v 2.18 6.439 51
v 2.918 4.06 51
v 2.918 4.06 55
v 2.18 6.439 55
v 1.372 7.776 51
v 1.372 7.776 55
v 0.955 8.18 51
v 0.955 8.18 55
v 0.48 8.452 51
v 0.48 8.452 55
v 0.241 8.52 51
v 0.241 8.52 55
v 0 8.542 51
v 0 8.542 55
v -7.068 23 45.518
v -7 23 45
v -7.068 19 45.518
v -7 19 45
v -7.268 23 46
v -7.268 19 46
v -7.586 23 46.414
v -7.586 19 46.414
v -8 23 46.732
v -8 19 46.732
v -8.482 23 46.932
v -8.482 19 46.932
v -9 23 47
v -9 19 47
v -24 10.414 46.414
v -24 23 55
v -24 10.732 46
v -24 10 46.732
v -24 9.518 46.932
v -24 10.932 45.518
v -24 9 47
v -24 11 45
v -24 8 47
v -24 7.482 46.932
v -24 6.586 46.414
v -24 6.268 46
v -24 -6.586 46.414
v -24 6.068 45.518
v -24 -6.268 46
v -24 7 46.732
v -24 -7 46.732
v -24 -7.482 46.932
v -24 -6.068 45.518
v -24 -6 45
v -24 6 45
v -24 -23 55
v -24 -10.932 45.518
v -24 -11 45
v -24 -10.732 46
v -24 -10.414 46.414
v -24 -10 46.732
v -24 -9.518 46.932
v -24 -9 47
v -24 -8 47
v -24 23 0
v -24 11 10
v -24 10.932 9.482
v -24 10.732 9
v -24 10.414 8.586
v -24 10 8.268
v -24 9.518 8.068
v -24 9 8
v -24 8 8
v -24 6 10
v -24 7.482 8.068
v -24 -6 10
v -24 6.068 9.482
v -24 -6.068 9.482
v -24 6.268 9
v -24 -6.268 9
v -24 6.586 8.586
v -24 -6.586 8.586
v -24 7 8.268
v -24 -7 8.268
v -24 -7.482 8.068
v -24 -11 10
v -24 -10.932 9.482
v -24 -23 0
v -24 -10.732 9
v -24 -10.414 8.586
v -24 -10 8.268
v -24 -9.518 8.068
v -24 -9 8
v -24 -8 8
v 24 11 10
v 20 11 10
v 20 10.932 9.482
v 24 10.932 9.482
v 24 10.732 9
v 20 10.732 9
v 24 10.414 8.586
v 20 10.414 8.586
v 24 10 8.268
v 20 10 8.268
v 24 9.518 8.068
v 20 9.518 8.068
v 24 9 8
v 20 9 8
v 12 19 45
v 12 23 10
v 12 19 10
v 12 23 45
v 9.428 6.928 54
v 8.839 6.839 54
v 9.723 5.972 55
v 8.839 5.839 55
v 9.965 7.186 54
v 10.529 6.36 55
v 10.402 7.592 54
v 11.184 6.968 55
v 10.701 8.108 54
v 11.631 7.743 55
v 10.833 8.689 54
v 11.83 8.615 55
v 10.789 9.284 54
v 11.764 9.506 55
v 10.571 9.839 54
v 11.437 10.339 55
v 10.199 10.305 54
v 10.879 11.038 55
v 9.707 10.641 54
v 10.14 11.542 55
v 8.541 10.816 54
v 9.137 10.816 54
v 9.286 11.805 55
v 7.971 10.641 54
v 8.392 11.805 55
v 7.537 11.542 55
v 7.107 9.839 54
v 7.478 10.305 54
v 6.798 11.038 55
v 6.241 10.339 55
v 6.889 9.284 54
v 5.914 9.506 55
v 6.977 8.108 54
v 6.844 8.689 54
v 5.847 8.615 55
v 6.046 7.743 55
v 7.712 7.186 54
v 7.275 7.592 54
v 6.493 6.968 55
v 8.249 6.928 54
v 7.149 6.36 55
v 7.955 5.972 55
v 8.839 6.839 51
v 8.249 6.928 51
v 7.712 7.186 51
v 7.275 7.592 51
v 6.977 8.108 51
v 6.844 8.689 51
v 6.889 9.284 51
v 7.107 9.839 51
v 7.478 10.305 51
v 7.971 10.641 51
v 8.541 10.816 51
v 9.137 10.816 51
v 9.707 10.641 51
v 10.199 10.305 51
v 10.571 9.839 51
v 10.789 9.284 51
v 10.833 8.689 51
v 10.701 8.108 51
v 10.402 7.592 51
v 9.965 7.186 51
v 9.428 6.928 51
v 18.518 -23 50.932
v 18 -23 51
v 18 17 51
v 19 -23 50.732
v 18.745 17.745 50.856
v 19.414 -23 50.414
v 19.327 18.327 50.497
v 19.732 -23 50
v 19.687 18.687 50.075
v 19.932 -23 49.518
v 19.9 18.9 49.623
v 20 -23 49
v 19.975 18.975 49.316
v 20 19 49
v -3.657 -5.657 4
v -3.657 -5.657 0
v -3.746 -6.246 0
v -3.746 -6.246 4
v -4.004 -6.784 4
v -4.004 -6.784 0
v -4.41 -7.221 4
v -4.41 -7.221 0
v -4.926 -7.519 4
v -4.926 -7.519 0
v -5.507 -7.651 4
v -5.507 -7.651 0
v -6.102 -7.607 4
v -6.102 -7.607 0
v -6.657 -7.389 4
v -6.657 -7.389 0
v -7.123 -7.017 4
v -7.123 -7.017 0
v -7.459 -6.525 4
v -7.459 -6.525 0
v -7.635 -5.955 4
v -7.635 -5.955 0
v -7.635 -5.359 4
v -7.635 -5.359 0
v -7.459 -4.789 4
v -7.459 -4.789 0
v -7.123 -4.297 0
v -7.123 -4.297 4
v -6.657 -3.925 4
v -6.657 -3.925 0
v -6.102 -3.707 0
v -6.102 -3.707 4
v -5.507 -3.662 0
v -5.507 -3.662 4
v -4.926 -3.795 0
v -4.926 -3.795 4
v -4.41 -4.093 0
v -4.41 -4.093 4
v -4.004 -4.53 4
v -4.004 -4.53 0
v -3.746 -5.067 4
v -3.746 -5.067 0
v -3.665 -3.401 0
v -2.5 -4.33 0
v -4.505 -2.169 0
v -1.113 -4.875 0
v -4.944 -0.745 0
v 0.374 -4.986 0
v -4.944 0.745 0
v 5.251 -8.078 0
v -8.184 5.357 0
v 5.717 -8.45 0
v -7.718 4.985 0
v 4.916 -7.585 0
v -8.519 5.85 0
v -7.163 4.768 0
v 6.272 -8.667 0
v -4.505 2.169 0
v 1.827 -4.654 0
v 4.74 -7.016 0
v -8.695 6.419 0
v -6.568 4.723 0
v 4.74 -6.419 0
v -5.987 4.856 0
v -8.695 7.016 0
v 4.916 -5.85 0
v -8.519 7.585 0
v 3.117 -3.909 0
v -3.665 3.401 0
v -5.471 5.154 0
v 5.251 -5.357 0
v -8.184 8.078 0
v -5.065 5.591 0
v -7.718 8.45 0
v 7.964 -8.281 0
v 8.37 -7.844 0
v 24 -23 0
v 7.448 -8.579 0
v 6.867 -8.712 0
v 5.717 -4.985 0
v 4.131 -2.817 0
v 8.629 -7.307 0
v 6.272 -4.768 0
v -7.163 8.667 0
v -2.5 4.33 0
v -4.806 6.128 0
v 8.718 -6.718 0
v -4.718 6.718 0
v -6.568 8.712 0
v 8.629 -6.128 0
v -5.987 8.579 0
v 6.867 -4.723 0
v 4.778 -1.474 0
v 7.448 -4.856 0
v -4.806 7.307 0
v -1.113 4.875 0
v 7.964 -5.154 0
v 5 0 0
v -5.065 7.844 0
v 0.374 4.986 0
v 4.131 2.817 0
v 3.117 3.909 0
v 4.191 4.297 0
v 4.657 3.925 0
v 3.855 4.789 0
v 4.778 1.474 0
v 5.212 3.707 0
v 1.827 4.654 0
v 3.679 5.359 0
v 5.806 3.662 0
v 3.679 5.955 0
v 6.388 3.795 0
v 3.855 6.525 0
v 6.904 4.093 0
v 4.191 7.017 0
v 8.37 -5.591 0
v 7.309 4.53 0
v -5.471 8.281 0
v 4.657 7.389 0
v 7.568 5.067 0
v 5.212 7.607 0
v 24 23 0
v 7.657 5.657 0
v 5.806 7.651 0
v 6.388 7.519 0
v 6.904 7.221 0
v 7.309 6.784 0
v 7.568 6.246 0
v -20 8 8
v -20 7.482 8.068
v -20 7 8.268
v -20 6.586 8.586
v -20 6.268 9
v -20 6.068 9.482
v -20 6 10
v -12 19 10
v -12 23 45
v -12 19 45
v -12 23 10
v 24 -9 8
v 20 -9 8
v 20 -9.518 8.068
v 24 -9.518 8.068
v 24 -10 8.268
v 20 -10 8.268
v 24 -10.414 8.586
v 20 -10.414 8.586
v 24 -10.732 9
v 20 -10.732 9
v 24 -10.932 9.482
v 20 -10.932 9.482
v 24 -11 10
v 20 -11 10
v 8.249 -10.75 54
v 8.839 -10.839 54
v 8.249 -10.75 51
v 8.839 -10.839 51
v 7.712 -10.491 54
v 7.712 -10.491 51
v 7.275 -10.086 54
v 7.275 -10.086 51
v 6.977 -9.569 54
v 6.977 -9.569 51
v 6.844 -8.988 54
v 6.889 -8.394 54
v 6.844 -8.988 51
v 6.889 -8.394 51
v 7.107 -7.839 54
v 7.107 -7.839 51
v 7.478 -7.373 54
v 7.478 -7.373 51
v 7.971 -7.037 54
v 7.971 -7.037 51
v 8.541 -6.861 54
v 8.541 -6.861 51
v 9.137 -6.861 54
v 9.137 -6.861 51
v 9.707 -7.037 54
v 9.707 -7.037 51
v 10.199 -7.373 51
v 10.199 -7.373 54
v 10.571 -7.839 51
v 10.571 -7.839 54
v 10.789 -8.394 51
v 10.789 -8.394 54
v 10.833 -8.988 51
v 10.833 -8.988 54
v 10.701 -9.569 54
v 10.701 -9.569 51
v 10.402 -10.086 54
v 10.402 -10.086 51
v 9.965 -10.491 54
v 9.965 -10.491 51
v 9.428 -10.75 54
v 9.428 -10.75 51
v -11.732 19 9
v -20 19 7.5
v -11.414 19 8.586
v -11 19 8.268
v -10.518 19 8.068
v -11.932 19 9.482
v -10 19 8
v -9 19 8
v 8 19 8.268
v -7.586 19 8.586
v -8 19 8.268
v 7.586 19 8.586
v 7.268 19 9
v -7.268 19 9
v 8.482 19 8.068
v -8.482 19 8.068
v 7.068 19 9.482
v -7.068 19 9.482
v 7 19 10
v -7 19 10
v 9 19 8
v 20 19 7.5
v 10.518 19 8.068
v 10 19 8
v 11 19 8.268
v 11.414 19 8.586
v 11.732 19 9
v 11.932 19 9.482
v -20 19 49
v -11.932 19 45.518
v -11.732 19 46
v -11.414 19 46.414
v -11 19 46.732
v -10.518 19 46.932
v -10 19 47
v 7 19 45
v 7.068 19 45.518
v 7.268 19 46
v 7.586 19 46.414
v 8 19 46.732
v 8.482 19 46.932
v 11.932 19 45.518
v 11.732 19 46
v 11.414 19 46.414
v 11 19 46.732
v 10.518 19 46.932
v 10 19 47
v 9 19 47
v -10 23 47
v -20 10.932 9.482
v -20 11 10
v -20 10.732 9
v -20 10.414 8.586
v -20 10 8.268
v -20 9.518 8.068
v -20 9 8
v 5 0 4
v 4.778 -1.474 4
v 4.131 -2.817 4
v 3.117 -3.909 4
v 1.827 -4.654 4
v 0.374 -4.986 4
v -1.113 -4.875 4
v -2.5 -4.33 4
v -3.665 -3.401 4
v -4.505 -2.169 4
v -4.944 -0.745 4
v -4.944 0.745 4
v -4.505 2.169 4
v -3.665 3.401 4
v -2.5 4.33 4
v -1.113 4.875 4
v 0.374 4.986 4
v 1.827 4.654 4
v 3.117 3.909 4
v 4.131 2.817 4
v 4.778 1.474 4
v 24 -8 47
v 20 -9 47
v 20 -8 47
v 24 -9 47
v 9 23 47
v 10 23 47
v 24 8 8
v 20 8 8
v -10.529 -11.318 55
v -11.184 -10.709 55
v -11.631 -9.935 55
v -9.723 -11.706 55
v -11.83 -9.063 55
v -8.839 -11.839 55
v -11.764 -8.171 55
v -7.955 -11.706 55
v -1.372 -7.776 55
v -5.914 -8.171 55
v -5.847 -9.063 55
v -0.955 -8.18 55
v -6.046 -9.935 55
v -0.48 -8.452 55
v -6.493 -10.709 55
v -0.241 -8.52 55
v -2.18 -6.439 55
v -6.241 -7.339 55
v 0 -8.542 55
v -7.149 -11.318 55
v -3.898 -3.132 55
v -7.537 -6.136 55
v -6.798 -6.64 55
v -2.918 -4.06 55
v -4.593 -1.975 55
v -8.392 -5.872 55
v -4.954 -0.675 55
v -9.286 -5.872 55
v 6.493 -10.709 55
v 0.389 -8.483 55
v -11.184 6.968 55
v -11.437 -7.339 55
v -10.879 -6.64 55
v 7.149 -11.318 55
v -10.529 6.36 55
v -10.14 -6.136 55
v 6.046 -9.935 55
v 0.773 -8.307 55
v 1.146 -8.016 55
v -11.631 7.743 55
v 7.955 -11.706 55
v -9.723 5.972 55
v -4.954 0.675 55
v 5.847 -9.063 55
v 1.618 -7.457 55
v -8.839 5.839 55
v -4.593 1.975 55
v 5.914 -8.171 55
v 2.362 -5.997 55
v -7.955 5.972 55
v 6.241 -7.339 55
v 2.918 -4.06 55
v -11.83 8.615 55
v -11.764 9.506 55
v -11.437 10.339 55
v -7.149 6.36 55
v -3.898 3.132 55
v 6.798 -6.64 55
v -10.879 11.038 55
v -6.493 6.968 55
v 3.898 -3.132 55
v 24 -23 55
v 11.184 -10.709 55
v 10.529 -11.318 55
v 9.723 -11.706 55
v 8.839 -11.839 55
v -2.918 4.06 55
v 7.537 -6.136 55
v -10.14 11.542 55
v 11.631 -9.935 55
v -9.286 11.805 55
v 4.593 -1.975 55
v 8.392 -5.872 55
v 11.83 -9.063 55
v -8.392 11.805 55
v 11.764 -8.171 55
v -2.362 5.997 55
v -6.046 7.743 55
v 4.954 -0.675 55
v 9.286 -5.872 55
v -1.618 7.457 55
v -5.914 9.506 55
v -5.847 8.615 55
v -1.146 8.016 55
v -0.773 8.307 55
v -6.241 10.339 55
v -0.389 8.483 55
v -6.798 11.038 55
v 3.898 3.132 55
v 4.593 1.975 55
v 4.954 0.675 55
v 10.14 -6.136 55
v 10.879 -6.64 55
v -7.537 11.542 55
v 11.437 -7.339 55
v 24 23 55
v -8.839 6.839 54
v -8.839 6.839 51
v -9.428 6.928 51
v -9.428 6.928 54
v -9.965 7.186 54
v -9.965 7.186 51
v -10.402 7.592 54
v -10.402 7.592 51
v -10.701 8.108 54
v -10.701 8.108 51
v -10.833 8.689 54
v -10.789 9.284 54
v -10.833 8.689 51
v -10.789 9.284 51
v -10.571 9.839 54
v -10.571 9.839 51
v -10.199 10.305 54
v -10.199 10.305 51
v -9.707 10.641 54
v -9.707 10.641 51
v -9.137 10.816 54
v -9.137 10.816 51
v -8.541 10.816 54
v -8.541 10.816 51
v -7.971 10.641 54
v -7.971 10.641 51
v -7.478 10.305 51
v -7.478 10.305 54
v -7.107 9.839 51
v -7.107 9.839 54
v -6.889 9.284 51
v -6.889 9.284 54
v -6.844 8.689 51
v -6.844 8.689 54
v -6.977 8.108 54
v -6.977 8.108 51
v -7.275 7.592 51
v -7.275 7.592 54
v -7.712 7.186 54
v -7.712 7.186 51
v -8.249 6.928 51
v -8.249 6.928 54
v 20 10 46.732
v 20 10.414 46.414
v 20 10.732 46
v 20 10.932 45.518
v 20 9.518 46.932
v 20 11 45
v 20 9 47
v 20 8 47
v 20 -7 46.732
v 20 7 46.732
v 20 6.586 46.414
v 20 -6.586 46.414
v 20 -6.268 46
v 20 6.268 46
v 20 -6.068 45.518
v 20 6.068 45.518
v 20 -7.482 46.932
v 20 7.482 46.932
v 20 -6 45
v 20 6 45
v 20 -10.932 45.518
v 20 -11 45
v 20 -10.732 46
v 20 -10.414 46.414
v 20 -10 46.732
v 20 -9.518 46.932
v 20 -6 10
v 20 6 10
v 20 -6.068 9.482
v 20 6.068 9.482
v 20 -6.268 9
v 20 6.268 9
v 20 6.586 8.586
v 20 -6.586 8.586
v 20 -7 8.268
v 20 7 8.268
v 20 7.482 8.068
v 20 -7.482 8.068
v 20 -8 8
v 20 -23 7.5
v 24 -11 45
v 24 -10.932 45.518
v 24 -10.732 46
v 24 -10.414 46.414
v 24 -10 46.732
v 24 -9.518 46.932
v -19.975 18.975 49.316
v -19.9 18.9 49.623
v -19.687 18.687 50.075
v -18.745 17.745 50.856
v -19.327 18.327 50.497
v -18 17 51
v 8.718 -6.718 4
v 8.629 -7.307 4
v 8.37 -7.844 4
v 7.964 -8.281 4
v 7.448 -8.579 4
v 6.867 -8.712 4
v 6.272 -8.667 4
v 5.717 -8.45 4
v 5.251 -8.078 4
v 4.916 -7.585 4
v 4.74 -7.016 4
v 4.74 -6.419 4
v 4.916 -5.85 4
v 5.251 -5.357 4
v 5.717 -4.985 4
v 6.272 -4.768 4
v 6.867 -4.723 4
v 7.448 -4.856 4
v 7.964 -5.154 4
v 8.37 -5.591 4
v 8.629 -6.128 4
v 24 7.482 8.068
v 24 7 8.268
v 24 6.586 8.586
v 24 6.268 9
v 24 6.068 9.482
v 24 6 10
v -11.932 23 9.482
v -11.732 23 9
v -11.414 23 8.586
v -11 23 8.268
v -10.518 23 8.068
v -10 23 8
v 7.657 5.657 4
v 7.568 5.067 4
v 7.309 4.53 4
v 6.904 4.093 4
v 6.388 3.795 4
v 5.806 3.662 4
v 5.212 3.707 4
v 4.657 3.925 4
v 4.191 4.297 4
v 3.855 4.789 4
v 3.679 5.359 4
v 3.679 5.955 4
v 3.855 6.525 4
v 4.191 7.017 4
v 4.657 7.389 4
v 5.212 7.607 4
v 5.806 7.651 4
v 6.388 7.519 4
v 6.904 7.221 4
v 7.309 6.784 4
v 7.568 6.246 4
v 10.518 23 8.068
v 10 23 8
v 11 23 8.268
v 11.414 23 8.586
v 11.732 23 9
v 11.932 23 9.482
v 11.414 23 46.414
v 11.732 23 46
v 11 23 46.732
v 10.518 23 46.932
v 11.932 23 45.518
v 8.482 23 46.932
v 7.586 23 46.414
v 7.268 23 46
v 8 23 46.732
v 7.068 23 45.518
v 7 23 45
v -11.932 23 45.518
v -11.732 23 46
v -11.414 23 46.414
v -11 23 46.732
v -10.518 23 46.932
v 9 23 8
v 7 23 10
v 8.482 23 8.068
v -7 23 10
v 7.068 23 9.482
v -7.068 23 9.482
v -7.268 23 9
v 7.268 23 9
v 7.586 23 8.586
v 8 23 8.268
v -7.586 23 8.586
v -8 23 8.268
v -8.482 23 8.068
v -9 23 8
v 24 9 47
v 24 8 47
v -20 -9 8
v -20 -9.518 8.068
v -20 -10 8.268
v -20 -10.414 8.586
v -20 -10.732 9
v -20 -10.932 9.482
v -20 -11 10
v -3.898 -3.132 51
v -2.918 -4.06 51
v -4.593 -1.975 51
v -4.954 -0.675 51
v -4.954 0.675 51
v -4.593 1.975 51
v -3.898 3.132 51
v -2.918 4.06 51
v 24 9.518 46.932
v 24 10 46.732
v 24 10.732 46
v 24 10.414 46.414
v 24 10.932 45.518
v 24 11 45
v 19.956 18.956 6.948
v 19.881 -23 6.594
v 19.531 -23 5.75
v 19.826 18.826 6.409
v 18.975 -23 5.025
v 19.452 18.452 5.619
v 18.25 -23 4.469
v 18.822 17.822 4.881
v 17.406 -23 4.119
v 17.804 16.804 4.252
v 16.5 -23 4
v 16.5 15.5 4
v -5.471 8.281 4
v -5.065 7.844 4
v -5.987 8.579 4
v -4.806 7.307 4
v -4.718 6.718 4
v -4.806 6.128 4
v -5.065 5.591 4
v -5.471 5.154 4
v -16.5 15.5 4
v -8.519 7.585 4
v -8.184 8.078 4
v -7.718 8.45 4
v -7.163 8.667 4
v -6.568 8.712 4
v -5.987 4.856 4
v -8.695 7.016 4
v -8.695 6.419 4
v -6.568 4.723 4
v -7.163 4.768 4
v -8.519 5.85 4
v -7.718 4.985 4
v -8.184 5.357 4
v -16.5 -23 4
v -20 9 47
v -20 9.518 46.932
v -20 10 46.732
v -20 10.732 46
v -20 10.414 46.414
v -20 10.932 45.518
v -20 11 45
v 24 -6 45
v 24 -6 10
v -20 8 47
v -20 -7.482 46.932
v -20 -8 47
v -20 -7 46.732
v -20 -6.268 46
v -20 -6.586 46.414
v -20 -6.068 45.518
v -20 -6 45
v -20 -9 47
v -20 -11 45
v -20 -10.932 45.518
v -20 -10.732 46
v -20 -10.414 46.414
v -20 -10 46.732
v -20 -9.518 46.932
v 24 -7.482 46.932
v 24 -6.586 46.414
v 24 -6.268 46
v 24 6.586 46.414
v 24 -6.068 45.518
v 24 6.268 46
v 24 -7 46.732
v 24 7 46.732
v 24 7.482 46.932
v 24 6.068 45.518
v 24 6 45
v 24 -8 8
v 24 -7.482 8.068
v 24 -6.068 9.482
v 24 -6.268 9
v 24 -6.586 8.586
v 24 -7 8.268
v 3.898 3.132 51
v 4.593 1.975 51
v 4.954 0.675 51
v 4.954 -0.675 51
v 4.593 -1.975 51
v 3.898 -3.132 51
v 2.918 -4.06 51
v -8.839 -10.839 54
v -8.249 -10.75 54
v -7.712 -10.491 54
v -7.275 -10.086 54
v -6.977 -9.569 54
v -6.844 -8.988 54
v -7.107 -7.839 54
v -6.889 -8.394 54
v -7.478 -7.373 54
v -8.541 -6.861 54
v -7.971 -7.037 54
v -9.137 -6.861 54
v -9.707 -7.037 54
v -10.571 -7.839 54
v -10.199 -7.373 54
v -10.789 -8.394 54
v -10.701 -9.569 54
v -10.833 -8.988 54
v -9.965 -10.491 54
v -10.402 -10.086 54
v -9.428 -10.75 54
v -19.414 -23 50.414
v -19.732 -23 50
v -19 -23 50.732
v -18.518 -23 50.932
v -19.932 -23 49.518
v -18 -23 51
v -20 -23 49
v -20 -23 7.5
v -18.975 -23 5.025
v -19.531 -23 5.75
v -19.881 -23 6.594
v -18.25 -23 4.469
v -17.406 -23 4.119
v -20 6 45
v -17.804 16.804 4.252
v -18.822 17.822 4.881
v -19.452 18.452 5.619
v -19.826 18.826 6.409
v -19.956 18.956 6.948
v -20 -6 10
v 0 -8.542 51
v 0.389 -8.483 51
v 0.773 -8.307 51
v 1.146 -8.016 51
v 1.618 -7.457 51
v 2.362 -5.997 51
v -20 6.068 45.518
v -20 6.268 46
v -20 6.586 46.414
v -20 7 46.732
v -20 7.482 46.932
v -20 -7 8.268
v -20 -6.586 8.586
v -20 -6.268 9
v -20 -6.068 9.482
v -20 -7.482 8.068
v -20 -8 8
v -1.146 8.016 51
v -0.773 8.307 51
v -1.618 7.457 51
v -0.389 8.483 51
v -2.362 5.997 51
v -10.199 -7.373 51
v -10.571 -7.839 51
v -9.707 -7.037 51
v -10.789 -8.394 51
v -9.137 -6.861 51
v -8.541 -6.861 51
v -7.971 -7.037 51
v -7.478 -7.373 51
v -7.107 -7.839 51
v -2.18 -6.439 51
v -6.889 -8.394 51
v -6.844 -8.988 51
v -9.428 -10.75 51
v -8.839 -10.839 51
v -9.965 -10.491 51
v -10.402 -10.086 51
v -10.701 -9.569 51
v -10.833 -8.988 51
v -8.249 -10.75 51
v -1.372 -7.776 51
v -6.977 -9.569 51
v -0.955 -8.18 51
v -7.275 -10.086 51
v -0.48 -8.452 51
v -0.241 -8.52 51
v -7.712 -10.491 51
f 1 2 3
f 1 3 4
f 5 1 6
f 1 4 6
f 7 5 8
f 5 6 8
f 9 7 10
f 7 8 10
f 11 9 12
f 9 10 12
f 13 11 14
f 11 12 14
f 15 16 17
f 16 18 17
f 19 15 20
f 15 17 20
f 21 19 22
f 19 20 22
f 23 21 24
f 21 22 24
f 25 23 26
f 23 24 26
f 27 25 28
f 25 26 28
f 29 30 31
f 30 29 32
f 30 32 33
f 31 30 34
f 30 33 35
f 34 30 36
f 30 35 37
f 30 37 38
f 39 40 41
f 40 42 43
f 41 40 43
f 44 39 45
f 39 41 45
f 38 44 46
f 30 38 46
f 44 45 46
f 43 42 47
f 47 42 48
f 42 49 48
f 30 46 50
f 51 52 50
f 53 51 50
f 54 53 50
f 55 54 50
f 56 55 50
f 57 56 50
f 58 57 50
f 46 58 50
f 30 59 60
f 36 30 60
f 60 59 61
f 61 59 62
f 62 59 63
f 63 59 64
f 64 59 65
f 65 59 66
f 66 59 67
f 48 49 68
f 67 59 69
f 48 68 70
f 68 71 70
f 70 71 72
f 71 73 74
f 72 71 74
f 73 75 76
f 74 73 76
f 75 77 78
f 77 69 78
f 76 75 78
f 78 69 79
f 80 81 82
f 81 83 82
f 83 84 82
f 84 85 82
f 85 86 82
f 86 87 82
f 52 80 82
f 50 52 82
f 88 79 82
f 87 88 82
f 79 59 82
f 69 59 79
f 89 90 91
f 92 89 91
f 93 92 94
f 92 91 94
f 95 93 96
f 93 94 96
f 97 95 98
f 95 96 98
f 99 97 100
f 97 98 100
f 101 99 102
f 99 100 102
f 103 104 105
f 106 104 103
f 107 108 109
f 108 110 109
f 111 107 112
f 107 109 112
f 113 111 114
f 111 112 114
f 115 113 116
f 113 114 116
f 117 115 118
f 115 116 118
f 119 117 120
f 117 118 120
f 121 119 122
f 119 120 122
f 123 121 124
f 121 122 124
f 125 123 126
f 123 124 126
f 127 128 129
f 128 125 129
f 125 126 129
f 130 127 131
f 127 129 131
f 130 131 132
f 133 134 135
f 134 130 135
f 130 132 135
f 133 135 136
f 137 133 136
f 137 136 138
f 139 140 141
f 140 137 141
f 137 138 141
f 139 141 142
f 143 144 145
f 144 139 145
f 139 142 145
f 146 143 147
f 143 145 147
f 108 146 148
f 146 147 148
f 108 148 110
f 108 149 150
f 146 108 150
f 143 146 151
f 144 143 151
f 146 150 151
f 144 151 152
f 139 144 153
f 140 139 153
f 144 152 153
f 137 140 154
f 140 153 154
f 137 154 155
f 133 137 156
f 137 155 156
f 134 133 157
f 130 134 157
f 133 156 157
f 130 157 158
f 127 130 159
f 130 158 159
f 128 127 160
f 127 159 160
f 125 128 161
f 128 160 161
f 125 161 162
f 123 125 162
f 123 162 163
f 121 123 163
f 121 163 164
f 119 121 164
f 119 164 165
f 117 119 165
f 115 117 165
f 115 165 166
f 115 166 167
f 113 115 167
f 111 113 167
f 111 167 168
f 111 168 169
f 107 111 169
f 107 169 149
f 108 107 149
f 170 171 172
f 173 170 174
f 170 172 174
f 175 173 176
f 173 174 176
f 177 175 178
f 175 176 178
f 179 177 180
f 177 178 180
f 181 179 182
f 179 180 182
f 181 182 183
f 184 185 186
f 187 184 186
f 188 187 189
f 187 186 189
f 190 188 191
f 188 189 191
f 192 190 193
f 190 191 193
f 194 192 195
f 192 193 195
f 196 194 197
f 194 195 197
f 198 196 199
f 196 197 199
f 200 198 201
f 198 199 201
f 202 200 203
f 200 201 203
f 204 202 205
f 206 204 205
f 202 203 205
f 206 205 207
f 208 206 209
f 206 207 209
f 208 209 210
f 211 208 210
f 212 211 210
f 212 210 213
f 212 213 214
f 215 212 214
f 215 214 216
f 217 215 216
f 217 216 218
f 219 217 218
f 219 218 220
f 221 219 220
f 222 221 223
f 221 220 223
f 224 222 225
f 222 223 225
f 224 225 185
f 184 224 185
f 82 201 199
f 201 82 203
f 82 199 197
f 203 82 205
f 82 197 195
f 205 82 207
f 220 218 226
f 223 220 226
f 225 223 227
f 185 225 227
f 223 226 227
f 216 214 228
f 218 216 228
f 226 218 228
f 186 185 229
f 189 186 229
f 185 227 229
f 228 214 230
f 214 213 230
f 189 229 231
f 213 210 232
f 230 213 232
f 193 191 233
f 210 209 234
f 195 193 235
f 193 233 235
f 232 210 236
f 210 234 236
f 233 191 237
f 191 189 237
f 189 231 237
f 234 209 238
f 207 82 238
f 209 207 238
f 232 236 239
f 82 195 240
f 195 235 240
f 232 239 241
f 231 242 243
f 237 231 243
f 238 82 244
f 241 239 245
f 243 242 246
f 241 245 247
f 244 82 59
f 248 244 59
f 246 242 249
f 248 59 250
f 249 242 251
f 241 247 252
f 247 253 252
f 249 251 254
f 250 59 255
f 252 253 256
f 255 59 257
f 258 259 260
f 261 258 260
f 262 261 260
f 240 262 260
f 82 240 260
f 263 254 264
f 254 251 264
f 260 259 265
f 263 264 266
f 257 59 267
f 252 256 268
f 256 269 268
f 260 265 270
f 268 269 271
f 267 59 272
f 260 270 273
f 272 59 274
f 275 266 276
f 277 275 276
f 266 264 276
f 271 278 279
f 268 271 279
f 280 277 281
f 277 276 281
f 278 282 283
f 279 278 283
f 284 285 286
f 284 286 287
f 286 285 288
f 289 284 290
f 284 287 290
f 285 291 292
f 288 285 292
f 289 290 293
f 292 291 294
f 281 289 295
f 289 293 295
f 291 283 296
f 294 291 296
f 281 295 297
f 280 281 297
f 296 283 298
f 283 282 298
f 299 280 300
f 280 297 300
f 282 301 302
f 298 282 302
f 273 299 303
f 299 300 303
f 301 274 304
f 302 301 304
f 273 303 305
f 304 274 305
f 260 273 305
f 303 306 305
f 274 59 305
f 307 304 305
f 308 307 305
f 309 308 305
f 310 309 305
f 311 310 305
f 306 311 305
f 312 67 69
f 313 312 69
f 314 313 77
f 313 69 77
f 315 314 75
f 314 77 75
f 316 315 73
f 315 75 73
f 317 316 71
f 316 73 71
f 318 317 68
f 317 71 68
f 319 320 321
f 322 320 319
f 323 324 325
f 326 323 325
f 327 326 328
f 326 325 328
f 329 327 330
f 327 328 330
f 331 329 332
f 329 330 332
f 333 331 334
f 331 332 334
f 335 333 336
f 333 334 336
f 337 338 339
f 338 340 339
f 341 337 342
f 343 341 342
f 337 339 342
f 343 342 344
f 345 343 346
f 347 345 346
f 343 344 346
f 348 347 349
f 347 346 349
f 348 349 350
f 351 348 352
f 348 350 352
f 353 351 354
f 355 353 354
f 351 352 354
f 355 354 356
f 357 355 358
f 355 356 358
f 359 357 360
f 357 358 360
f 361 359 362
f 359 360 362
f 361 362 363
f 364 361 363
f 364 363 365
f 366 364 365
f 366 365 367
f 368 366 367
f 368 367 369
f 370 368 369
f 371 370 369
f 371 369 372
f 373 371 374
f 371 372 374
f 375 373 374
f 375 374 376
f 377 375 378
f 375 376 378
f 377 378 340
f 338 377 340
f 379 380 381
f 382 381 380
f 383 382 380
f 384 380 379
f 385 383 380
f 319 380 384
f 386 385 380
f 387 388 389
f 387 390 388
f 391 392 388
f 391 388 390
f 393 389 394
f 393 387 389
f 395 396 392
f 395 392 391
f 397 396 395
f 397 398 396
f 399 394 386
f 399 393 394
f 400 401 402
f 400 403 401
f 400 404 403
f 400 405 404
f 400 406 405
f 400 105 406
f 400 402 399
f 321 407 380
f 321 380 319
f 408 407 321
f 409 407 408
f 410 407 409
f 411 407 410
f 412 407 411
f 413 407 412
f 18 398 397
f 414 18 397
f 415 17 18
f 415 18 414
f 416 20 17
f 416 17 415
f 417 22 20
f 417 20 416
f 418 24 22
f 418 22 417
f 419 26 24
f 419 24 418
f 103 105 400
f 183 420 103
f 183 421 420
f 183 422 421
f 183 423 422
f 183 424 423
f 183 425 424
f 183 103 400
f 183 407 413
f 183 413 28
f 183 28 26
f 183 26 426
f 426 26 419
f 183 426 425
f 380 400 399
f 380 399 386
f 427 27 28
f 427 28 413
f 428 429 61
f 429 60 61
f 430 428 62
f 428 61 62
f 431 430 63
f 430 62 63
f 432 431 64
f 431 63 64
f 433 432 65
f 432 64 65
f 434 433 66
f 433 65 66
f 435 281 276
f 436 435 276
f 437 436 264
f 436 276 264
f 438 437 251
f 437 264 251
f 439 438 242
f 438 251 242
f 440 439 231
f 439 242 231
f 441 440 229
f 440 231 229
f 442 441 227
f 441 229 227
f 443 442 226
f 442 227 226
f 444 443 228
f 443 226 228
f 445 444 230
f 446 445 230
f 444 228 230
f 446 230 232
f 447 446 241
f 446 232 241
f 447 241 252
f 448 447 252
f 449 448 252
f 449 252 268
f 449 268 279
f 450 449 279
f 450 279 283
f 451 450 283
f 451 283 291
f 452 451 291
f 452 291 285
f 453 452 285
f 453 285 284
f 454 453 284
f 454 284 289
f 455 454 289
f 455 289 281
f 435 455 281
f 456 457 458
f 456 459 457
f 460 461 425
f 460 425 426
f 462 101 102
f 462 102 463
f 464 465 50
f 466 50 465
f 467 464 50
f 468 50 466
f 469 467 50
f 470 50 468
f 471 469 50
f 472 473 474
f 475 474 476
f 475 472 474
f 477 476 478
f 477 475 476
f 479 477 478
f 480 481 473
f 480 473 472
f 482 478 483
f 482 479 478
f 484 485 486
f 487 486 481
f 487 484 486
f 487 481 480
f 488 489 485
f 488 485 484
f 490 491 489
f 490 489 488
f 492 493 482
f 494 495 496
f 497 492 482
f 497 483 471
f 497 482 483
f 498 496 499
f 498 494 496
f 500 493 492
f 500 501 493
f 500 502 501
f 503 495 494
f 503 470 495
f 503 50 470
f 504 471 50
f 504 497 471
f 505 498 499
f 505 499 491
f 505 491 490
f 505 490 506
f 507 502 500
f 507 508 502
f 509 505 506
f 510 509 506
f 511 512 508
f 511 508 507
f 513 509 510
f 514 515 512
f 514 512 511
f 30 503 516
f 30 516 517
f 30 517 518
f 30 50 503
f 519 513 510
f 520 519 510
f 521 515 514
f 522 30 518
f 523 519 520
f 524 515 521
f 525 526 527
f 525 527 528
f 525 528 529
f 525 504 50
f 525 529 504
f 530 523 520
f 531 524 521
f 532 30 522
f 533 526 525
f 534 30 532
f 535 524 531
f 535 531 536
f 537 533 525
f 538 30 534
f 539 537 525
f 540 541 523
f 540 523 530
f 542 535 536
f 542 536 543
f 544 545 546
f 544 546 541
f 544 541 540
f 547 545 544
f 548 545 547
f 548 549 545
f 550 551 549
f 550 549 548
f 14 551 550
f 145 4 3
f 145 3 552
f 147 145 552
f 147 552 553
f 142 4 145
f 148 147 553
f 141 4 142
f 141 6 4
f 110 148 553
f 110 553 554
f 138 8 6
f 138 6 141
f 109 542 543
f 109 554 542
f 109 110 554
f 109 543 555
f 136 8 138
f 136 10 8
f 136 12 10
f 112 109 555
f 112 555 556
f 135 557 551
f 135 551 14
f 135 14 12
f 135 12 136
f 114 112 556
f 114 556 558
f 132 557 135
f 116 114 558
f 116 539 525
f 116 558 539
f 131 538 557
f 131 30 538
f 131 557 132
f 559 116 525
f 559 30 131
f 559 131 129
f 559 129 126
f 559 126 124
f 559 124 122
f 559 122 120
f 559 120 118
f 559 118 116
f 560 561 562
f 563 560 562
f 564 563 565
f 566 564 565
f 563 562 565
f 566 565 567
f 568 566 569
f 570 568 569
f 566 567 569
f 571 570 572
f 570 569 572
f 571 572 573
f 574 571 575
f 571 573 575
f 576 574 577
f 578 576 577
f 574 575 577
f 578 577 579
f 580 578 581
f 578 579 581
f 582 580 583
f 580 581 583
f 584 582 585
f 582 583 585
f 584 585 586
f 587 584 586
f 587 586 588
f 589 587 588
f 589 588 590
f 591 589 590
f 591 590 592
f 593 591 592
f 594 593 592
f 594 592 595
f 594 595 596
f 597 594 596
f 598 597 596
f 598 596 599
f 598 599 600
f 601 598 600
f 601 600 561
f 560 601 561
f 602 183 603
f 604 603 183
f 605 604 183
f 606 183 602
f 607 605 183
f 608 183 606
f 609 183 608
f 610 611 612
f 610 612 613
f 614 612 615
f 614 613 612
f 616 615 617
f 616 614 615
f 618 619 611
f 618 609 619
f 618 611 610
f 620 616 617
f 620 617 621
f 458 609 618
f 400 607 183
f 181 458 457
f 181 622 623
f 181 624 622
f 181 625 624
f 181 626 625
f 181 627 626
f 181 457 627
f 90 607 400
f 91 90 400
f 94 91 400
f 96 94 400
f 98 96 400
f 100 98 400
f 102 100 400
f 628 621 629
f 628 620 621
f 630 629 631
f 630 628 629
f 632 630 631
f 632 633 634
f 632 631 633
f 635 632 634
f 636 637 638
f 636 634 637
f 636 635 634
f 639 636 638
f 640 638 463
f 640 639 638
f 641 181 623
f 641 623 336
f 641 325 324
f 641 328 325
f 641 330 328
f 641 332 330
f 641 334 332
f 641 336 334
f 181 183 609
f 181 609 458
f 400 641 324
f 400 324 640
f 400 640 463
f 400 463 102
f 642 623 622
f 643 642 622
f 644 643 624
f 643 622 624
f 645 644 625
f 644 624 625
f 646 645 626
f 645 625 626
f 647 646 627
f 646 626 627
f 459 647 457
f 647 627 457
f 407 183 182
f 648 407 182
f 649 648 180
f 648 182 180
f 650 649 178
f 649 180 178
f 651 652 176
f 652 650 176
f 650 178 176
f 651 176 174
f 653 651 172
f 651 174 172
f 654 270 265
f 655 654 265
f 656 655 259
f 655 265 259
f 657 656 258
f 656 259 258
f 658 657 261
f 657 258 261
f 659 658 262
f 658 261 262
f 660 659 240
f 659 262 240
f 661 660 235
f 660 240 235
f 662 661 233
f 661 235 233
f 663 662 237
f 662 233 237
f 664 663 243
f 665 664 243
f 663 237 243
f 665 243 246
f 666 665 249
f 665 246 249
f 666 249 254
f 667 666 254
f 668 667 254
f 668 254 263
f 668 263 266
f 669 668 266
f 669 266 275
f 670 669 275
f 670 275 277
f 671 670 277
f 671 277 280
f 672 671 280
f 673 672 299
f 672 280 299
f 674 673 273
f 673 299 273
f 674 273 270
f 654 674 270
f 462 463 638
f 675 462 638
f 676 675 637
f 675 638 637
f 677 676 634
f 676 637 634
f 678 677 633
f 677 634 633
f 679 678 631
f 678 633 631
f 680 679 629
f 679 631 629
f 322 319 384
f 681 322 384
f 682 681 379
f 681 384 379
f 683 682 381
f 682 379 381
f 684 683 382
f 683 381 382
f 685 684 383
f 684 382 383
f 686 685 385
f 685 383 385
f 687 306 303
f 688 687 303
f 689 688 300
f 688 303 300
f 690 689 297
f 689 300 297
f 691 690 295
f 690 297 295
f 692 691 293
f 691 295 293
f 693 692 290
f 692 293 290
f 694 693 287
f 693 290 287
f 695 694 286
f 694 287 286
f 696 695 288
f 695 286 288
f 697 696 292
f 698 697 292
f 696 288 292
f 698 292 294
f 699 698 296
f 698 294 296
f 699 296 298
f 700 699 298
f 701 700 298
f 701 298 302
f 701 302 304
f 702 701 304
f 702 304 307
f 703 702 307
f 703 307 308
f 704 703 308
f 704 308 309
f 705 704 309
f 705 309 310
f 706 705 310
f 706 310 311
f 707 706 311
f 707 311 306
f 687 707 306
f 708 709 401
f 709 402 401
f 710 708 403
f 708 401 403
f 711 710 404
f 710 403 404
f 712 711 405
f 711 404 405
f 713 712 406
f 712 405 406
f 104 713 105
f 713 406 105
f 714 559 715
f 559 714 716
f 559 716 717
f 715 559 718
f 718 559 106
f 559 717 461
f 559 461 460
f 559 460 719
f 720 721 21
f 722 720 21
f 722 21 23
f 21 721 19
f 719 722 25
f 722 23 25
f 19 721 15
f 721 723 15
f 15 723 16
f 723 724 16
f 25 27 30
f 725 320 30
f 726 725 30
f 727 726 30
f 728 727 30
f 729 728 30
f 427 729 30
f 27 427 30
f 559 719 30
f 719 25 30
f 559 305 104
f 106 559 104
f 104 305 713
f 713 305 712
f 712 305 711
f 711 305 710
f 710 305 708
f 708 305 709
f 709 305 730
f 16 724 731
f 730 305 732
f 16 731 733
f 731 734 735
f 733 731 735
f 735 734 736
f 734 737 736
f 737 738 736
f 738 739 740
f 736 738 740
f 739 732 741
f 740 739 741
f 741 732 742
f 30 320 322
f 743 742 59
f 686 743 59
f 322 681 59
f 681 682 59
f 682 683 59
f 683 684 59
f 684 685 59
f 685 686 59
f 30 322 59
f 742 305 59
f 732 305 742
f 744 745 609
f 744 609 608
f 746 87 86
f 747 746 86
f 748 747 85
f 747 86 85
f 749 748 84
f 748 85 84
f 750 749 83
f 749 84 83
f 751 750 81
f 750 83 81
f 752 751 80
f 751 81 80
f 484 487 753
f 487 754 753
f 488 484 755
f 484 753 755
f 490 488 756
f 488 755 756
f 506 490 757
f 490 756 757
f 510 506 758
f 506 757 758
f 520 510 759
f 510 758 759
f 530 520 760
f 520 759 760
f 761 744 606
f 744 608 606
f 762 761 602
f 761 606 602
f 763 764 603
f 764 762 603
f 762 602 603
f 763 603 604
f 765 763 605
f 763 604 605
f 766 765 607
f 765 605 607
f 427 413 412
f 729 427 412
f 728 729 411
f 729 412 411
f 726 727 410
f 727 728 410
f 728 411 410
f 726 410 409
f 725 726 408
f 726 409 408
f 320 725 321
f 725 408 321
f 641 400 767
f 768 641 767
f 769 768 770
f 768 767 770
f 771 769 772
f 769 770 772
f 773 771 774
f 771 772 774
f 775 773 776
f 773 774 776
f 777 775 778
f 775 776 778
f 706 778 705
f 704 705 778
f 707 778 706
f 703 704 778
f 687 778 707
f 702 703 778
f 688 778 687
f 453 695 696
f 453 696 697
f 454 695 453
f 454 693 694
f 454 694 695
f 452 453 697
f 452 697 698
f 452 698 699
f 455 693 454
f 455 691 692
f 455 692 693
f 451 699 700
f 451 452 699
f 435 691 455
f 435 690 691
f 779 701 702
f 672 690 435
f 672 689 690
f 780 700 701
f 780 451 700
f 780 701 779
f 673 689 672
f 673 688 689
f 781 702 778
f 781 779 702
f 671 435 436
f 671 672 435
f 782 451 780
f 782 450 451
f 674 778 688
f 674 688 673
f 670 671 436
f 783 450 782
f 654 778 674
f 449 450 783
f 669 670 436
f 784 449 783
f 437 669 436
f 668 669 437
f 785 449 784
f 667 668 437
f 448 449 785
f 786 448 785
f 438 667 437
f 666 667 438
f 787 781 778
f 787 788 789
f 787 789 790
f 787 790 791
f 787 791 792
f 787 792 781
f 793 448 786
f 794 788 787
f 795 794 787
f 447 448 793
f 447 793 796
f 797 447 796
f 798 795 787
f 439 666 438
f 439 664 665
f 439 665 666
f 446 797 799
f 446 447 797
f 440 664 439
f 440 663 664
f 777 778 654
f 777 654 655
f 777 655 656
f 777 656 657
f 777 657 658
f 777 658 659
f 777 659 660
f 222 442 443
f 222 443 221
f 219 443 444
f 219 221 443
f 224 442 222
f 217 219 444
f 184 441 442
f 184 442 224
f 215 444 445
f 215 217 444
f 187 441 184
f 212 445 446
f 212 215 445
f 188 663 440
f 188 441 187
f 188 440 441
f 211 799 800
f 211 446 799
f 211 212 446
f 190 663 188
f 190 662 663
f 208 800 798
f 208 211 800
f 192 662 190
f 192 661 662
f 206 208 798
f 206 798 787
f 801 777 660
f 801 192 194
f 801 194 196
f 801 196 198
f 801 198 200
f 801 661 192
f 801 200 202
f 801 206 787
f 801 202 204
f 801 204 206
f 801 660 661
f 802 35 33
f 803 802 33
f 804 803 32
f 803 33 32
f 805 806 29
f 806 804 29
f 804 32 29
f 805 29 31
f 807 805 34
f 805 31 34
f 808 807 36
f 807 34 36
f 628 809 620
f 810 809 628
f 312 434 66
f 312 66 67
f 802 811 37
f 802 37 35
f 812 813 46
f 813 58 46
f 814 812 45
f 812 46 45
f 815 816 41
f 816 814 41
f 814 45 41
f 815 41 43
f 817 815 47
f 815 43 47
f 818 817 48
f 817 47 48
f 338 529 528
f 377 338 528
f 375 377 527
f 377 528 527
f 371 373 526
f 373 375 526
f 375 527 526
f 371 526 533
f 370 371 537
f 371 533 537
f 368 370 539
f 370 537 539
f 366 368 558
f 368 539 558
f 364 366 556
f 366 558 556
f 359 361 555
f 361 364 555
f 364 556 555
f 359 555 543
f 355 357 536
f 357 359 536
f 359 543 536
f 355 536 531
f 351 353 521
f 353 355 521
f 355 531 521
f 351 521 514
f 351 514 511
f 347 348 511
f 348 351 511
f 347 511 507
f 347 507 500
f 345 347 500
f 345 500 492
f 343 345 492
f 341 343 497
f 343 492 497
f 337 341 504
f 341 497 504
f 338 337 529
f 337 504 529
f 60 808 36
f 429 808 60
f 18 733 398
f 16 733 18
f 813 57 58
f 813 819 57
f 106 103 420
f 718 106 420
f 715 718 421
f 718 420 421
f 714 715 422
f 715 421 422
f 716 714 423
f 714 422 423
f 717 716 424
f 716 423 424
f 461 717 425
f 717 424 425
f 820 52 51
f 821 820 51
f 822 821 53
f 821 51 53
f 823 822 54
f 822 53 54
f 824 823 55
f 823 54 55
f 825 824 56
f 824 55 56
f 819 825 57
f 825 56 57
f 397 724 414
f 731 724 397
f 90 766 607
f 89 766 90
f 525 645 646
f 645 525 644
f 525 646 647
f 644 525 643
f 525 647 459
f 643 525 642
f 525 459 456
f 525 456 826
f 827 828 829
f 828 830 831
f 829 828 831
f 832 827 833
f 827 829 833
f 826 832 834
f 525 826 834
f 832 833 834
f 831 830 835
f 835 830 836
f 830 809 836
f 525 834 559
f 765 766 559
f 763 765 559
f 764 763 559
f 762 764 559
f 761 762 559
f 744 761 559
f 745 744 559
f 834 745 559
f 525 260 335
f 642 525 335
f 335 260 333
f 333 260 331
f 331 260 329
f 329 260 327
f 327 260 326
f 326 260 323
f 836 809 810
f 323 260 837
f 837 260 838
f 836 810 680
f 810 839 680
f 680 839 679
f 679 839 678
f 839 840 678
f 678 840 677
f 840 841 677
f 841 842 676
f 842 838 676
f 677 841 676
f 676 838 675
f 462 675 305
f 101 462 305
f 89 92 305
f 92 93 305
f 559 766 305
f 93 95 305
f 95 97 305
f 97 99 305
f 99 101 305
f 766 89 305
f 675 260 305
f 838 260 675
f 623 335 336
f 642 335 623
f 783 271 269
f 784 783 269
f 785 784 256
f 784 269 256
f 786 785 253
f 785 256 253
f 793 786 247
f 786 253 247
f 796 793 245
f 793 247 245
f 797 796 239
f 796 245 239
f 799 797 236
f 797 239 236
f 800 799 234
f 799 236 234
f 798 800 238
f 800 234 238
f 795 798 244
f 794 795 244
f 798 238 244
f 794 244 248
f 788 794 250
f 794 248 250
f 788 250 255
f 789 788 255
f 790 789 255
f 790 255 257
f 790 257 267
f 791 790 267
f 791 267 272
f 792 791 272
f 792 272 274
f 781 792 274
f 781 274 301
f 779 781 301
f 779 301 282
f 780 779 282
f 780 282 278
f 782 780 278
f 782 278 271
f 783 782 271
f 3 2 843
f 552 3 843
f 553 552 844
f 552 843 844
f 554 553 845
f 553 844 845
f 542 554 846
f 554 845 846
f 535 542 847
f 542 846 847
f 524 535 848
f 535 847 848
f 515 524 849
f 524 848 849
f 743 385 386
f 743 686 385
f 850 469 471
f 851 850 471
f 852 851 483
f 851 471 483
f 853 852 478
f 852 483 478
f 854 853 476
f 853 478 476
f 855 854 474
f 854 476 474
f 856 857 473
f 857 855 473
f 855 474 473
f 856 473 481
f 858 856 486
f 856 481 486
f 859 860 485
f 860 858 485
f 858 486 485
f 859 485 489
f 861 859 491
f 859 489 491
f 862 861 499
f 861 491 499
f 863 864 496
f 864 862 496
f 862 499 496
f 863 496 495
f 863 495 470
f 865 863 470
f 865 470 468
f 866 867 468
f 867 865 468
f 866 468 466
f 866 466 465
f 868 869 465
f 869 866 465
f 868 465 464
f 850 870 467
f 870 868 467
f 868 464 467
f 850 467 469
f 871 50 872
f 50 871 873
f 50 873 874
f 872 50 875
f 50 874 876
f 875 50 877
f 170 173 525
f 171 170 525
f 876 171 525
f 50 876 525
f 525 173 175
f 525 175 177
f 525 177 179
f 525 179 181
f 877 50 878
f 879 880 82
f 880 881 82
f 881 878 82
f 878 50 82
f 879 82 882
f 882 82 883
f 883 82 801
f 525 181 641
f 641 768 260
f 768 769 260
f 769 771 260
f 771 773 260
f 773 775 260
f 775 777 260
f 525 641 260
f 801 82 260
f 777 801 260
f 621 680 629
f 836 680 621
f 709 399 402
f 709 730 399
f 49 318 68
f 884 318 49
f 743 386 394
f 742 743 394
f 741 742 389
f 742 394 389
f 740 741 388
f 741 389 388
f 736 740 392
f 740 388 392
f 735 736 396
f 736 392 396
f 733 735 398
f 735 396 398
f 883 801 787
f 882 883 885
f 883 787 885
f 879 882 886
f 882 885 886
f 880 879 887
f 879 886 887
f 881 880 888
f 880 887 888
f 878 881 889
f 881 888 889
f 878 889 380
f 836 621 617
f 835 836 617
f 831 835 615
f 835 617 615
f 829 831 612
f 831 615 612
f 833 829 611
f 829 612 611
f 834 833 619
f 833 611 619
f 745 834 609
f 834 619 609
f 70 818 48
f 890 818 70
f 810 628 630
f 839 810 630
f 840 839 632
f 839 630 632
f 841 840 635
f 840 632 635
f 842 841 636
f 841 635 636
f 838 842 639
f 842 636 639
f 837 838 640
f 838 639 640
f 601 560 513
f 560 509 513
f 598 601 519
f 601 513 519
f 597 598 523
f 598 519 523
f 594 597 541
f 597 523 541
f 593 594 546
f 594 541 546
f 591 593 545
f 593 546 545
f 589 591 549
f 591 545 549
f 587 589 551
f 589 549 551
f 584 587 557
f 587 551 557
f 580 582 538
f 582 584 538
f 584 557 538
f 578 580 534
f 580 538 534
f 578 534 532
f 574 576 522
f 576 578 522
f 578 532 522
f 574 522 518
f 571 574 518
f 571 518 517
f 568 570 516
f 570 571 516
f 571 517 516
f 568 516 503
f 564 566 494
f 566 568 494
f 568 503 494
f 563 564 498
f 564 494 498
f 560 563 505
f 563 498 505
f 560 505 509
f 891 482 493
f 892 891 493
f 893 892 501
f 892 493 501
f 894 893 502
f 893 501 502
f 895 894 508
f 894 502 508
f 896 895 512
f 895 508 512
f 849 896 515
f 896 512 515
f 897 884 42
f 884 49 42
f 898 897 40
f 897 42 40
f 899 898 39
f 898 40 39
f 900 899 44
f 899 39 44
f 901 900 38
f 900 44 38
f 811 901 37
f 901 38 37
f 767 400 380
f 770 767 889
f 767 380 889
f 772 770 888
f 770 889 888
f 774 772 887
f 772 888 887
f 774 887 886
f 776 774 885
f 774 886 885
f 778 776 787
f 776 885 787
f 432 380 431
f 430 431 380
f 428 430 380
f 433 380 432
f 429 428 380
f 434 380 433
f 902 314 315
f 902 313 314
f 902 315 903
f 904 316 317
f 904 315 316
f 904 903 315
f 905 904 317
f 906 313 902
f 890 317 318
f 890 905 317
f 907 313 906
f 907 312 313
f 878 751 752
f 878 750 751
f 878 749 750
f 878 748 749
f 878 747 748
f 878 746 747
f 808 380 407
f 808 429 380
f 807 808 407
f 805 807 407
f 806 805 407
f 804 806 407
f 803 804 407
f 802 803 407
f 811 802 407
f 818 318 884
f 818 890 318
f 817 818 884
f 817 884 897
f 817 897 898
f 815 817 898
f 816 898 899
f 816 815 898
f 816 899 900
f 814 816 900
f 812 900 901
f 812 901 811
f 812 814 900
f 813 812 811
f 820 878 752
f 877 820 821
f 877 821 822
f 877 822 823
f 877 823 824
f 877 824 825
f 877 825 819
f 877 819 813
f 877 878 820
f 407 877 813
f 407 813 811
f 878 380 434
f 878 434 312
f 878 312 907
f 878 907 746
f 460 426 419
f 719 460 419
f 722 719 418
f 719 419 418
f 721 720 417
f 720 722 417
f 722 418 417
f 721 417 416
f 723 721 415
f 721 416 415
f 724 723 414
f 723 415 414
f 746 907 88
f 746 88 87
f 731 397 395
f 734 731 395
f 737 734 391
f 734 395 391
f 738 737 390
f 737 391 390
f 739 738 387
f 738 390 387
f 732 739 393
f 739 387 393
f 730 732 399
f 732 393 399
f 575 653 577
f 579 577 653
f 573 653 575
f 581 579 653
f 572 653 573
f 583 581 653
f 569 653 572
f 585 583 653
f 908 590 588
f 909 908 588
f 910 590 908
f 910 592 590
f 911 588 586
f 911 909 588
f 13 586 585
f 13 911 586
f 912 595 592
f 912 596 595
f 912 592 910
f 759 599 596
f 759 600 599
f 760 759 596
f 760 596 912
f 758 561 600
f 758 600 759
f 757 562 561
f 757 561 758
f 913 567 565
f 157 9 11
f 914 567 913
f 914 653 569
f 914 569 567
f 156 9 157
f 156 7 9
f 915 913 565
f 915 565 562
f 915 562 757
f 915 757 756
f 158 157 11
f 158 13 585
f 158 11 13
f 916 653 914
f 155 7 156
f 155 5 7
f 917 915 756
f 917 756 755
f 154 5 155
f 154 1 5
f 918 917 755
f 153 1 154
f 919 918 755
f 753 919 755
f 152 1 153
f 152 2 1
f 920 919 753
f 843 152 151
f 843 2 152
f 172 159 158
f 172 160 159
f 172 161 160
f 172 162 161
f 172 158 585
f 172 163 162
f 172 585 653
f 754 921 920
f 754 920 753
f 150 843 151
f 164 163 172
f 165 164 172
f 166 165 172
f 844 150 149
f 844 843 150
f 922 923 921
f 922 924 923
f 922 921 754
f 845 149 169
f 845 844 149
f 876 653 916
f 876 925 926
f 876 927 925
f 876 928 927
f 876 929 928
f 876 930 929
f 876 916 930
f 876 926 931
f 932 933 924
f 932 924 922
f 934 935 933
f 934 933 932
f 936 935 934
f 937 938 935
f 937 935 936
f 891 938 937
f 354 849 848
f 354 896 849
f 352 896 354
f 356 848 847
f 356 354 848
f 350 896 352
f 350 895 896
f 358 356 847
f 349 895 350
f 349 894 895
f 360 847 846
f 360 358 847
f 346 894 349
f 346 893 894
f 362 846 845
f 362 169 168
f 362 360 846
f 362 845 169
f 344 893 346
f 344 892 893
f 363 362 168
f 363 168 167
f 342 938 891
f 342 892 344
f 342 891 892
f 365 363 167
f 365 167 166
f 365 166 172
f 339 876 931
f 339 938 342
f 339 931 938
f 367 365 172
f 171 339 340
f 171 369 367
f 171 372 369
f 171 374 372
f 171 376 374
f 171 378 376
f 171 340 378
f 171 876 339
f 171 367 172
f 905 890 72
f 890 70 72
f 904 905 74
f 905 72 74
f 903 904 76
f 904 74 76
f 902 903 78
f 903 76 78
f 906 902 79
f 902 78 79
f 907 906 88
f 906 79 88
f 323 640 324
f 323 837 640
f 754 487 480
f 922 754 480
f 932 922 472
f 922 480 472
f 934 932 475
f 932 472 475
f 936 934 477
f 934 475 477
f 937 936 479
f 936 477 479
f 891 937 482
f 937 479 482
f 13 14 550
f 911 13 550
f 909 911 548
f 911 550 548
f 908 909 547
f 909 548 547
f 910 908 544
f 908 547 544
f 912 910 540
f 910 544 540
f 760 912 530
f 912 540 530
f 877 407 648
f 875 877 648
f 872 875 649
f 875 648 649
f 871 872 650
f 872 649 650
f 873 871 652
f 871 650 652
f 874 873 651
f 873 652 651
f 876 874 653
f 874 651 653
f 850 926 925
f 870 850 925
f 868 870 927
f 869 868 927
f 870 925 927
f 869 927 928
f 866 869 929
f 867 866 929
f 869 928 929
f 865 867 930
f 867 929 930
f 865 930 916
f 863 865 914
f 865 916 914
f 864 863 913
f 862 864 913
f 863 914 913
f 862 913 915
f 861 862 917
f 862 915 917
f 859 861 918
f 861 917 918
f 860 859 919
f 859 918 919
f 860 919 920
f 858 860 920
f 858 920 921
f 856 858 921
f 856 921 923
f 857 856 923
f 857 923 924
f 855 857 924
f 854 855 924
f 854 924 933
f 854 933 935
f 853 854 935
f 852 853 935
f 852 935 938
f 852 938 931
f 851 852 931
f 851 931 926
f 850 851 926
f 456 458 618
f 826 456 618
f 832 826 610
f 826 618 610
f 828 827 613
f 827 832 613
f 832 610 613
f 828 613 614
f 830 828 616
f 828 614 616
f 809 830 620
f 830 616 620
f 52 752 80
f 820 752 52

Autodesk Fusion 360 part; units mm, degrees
sketch "Sketch1" plane through (0, 0, 0) normal (0, 0, 1) x (1, 0, 0)
  line L0 (-24, -23) -> (24, -23)
  line L1 (24, -23) -> (24, 23)
  line L2 (24, 23) -> (-24, 23)
  line L3 (-24, 23) -> (-24, -23)
  dimension "d1" = 48
  dimension "d2" = 46
  dimension "d3" = 24
  dimension "d4" = 23
extrude "Extrude1" add sketch "Sketch1" along normal blind 55
sketch "Sketch2" plane through (0, -23, 0) normal (0, -1, 0) x (1, 0, 0)
  line L0 (-24, 0) -> (24, 0)
  line L1 (24, 0) -> (24, 55)
  line L2 (24, 55) -> (-24, 55)
  line L3 (-24, 55) -> (-24, 0)
  line L4 (-20, 51) -> (20, 51)
  line L5 (20, 51) -> (20, 4)
  line L6 (20, 4) -> (-20, 4)
  line L7 (-20, 4) -> (-20, 51)
  dimension "d7" = 40
  dimension "d8" = 20
  dimension "d10" = 4
  dimension "d58" = 4
extrude "Extrude2" cut sketch "Sketch2" against normal blind 42 contours L4 L5 L6 L7
sketch "Sketch4" plane through (0, 0, 55) normal (0, 0, 1) x (-1, 0, 0)
  line L0 (24, -23) -> (24, 23)
  line L1 (24, 23) -> (-24, 23)
  line L2 (-24, 23) -> (-24, -23)
  line L3 (-24, -23) -> (24, -23)
  circle A0 centre (0, 0) radius 5
  dimension "d23" = 10
hole "Hole1" at (0, 0, 55) direction (0, 0, -1) diameter 10 depth 4 tip angle 118
sketch "Sketch5" plane through (0, 0, 55) normal (0, 0, 1) x (-1, 0, 0)
  circle A0 centre (0, 0) radius 5
  line L0 (24, -23) -> (24, 23)
  line L1 (24, 23) -> (-24, 23)
  line L2 (-24, 23) -> (-24, -23)
  line L3 (-24, -23) -> (24, -23)
  circle A1 centre (-8.8388, -8.8388) radius 1.5
  point P0 (8.8388, -8.8388)
  point P1 (8.8388, 8.8388)
  point P2 (-8.8388, 8.8388)
  dimension "d27" = 12.5
  dimension "d28" = 3
  dimension "d30" = 360
hole "Hole2" at (8.8388, 8.8388, 55) at (-8.8388, 8.8388, 55) at (-8.8388, -8.8388, 55) at (8.8388, -8.8388, 55) direction (0, 0, -1) diameter 4 depth 4 tip angle 118 countersink diameter 6 countersink angle 90
sketch "Sketch7" plane through (0, 0, 0) normal (0, 0, -1) x (1, 0, 0)
  line L0 (-24, 23) -> (-24, -23)
  line L1 (-24, -23) -> (24, -23)
  line L2 (24, -23) -> (24, 23)
  line L3 (24, 23) -> (-24, 23)
  circle A0 centre (0, 0) radius 5
  circle A1 centre (5.6569, -5.6569) radius 2
  circle A2 centre (6.7175, 6.7175) radius 2
  circle A3 centre (-6.7175, -6.7175) radius 2
  circle A4 centre (-5.6569, 5.6569) radius 2
  dimension "d45" = 10
  dimension "d67" = 4
  dimension "d68" = 4
  dimension "d69" = 9.5
  dimension "d70" = 8
  dimension "d71" = 17.3431
  dimension "d72" = 16.2825
  dimension "d74" = 360
extrude "Extrude4" cut sketch "Sketch7" against normal blind 4 contours A0 | A1 | A2 | A3 | A4
sketch "Sketch8" plane through (0, 0, 55) normal (0, 0, 1) x (-1, 0, 0)
  circle A0 centre (0, 0) radius 5
  line L0 (24, -23) -> (24, 23)
  line L1 (24, 23) -> (-24, 23)
  line L2 (-24, 23) -> (-24, -23)
  line L3 (-24, -23) -> (24, -23)
  ellipse E0 centre (0, 0) end of major axis (0, 8.5421) minor radius 3.3168
  line L4 (0, -8.5421) -> (0, 8.5421)
  line L5 (3.3168, 0) -> (-3.3168, 0)
  circle A1 centre (8.8388, 8.8388) radius 3
  circle A2 centre (-8.8388, -8.8388) radius 3
  circle A3 centre (8.8388, -8.8388) radius 3
  circle A4 centre (-8.8388, 8.8388) radius 3
extrude "Extrude5" cut sketch "Sketch8" against normal blind 4 contours A0 E0 L4 | A0 E0 L4 | A0 E0 L4 | A0 E0 L4
sketch "Sketch3" plane through (24, 0, 0) normal (1, 0, 0) x (0, 1, 0)
  line L0 (-21, 0) -> (23, 0)
  line L1 (23, 0) -> (23, 50)
  line L2 (23, 50) -> (-21, 50)
  line L3 (-11, 47) -> (-6, 47)
  line L4 (-6, 47) -> (-6, 8)
  line L5 (-6, 8) -> (-11, 8)
  line L6 (-11, 8) -> (-11, 47)
  line L7 (6, 47) -> (11, 47)
  line L8 (11, 47) -> (11, 8)
  line L9 (11, 8) -> (6, 8)
  line L10 (6, 8) -> (6, 47)
  line L11 (-23, 0) -> (23, 0)
  line L12 (23, 0) -> (23, 55)
  line L13 (23, 55) -> (-23, 55)
  line L14 (-23, 55) -> (-23, 0)
  line L15 (-23, 51) -> (-23, 4)
  point P0 (-23, 55)
  point P1 (23, 55)
  dimension "d16" = 8
  dimension "d20" = 12
  dimension "d60" = 8
  dimension "d75" = 5
  dimension "d76" = 5
  dimension "d97" = 12
  dimension "d100" = 8
  dimension "d101" = 8
extrude "Extrude6" cut sketch "Sketch3" against normal blind 48 contours L3 L4 L5 L6 | L7 L8 L9 L10
sketch "Sketch9" plane through (0, 23, 0) normal (0, 1, 0) x (-1, 0, 0)
  line L0 (-24, 0) -> (24, 0)
  line L1 (24, 0) -> (24, 55)
  line L2 (24, 55) -> (-24, 55)
  line L3 (-24, 55) -> (-24, 0)
  line L4 (-12, 47) -> (-7, 47)
  line L5 (-7, 47) -> (-7, 8)
  line L6 (-7, 8) -> (-12, 8)
  line L7 (-12, 8) -> (-12, 47)
  line L8 (7, 47) -> (12, 47)
  line L9 (12, 47) -> (12, 8)
  line L10 (12, 8) -> (7, 8)
  line L11 (7, 8) -> (7, 47)
  line L12 (-24, 0) -> (24, 0)
  dimension "d79" = 8
  dimension "d80" = 8
  dimension "d81" = 8
  dimension "d82" = 8
  dimension "d83" = 12
  dimension "d84" = 12
  dimension "d85" = 5
  dimension "d86" = 5
extrude "Extrude7" cut sketch "Sketch9" against normal blind 44 contours L4 L5 L6 L7 | L8 L9 L10 L11
fillet "Fillet2" radius 3.5 3 edges at (0, 19, 4) (-20, -2, 4) (20, -2, 4)
fillet "Fillet3" radius 2 24 edges at (22, 11, 8) (22, -6, 8) (-22, 11, 8) (-22, -6, 8) (22, 6, 8) (22, -11, 8) (22, -11, 47) (22, 6, 47) (22, 11, 47) (22, -6, 47) (-22, -6, 47) (-22, -11, 47) (-22, 6, 47) (-22, 11, 47) (-22, -11, 8) (-22, 6, 8) (-7, 21, 8) (12, 21, 8) (7, 21, 8) (-12, 21, 8) (12, 21, 47) (-7, 21, 47) (7, 21, 47) (-12, 21, 47)
fillet "Fillet4" radius 2 3 edges at (-20, -2, 51) (0, 19, 51) (20, -2, 51)
